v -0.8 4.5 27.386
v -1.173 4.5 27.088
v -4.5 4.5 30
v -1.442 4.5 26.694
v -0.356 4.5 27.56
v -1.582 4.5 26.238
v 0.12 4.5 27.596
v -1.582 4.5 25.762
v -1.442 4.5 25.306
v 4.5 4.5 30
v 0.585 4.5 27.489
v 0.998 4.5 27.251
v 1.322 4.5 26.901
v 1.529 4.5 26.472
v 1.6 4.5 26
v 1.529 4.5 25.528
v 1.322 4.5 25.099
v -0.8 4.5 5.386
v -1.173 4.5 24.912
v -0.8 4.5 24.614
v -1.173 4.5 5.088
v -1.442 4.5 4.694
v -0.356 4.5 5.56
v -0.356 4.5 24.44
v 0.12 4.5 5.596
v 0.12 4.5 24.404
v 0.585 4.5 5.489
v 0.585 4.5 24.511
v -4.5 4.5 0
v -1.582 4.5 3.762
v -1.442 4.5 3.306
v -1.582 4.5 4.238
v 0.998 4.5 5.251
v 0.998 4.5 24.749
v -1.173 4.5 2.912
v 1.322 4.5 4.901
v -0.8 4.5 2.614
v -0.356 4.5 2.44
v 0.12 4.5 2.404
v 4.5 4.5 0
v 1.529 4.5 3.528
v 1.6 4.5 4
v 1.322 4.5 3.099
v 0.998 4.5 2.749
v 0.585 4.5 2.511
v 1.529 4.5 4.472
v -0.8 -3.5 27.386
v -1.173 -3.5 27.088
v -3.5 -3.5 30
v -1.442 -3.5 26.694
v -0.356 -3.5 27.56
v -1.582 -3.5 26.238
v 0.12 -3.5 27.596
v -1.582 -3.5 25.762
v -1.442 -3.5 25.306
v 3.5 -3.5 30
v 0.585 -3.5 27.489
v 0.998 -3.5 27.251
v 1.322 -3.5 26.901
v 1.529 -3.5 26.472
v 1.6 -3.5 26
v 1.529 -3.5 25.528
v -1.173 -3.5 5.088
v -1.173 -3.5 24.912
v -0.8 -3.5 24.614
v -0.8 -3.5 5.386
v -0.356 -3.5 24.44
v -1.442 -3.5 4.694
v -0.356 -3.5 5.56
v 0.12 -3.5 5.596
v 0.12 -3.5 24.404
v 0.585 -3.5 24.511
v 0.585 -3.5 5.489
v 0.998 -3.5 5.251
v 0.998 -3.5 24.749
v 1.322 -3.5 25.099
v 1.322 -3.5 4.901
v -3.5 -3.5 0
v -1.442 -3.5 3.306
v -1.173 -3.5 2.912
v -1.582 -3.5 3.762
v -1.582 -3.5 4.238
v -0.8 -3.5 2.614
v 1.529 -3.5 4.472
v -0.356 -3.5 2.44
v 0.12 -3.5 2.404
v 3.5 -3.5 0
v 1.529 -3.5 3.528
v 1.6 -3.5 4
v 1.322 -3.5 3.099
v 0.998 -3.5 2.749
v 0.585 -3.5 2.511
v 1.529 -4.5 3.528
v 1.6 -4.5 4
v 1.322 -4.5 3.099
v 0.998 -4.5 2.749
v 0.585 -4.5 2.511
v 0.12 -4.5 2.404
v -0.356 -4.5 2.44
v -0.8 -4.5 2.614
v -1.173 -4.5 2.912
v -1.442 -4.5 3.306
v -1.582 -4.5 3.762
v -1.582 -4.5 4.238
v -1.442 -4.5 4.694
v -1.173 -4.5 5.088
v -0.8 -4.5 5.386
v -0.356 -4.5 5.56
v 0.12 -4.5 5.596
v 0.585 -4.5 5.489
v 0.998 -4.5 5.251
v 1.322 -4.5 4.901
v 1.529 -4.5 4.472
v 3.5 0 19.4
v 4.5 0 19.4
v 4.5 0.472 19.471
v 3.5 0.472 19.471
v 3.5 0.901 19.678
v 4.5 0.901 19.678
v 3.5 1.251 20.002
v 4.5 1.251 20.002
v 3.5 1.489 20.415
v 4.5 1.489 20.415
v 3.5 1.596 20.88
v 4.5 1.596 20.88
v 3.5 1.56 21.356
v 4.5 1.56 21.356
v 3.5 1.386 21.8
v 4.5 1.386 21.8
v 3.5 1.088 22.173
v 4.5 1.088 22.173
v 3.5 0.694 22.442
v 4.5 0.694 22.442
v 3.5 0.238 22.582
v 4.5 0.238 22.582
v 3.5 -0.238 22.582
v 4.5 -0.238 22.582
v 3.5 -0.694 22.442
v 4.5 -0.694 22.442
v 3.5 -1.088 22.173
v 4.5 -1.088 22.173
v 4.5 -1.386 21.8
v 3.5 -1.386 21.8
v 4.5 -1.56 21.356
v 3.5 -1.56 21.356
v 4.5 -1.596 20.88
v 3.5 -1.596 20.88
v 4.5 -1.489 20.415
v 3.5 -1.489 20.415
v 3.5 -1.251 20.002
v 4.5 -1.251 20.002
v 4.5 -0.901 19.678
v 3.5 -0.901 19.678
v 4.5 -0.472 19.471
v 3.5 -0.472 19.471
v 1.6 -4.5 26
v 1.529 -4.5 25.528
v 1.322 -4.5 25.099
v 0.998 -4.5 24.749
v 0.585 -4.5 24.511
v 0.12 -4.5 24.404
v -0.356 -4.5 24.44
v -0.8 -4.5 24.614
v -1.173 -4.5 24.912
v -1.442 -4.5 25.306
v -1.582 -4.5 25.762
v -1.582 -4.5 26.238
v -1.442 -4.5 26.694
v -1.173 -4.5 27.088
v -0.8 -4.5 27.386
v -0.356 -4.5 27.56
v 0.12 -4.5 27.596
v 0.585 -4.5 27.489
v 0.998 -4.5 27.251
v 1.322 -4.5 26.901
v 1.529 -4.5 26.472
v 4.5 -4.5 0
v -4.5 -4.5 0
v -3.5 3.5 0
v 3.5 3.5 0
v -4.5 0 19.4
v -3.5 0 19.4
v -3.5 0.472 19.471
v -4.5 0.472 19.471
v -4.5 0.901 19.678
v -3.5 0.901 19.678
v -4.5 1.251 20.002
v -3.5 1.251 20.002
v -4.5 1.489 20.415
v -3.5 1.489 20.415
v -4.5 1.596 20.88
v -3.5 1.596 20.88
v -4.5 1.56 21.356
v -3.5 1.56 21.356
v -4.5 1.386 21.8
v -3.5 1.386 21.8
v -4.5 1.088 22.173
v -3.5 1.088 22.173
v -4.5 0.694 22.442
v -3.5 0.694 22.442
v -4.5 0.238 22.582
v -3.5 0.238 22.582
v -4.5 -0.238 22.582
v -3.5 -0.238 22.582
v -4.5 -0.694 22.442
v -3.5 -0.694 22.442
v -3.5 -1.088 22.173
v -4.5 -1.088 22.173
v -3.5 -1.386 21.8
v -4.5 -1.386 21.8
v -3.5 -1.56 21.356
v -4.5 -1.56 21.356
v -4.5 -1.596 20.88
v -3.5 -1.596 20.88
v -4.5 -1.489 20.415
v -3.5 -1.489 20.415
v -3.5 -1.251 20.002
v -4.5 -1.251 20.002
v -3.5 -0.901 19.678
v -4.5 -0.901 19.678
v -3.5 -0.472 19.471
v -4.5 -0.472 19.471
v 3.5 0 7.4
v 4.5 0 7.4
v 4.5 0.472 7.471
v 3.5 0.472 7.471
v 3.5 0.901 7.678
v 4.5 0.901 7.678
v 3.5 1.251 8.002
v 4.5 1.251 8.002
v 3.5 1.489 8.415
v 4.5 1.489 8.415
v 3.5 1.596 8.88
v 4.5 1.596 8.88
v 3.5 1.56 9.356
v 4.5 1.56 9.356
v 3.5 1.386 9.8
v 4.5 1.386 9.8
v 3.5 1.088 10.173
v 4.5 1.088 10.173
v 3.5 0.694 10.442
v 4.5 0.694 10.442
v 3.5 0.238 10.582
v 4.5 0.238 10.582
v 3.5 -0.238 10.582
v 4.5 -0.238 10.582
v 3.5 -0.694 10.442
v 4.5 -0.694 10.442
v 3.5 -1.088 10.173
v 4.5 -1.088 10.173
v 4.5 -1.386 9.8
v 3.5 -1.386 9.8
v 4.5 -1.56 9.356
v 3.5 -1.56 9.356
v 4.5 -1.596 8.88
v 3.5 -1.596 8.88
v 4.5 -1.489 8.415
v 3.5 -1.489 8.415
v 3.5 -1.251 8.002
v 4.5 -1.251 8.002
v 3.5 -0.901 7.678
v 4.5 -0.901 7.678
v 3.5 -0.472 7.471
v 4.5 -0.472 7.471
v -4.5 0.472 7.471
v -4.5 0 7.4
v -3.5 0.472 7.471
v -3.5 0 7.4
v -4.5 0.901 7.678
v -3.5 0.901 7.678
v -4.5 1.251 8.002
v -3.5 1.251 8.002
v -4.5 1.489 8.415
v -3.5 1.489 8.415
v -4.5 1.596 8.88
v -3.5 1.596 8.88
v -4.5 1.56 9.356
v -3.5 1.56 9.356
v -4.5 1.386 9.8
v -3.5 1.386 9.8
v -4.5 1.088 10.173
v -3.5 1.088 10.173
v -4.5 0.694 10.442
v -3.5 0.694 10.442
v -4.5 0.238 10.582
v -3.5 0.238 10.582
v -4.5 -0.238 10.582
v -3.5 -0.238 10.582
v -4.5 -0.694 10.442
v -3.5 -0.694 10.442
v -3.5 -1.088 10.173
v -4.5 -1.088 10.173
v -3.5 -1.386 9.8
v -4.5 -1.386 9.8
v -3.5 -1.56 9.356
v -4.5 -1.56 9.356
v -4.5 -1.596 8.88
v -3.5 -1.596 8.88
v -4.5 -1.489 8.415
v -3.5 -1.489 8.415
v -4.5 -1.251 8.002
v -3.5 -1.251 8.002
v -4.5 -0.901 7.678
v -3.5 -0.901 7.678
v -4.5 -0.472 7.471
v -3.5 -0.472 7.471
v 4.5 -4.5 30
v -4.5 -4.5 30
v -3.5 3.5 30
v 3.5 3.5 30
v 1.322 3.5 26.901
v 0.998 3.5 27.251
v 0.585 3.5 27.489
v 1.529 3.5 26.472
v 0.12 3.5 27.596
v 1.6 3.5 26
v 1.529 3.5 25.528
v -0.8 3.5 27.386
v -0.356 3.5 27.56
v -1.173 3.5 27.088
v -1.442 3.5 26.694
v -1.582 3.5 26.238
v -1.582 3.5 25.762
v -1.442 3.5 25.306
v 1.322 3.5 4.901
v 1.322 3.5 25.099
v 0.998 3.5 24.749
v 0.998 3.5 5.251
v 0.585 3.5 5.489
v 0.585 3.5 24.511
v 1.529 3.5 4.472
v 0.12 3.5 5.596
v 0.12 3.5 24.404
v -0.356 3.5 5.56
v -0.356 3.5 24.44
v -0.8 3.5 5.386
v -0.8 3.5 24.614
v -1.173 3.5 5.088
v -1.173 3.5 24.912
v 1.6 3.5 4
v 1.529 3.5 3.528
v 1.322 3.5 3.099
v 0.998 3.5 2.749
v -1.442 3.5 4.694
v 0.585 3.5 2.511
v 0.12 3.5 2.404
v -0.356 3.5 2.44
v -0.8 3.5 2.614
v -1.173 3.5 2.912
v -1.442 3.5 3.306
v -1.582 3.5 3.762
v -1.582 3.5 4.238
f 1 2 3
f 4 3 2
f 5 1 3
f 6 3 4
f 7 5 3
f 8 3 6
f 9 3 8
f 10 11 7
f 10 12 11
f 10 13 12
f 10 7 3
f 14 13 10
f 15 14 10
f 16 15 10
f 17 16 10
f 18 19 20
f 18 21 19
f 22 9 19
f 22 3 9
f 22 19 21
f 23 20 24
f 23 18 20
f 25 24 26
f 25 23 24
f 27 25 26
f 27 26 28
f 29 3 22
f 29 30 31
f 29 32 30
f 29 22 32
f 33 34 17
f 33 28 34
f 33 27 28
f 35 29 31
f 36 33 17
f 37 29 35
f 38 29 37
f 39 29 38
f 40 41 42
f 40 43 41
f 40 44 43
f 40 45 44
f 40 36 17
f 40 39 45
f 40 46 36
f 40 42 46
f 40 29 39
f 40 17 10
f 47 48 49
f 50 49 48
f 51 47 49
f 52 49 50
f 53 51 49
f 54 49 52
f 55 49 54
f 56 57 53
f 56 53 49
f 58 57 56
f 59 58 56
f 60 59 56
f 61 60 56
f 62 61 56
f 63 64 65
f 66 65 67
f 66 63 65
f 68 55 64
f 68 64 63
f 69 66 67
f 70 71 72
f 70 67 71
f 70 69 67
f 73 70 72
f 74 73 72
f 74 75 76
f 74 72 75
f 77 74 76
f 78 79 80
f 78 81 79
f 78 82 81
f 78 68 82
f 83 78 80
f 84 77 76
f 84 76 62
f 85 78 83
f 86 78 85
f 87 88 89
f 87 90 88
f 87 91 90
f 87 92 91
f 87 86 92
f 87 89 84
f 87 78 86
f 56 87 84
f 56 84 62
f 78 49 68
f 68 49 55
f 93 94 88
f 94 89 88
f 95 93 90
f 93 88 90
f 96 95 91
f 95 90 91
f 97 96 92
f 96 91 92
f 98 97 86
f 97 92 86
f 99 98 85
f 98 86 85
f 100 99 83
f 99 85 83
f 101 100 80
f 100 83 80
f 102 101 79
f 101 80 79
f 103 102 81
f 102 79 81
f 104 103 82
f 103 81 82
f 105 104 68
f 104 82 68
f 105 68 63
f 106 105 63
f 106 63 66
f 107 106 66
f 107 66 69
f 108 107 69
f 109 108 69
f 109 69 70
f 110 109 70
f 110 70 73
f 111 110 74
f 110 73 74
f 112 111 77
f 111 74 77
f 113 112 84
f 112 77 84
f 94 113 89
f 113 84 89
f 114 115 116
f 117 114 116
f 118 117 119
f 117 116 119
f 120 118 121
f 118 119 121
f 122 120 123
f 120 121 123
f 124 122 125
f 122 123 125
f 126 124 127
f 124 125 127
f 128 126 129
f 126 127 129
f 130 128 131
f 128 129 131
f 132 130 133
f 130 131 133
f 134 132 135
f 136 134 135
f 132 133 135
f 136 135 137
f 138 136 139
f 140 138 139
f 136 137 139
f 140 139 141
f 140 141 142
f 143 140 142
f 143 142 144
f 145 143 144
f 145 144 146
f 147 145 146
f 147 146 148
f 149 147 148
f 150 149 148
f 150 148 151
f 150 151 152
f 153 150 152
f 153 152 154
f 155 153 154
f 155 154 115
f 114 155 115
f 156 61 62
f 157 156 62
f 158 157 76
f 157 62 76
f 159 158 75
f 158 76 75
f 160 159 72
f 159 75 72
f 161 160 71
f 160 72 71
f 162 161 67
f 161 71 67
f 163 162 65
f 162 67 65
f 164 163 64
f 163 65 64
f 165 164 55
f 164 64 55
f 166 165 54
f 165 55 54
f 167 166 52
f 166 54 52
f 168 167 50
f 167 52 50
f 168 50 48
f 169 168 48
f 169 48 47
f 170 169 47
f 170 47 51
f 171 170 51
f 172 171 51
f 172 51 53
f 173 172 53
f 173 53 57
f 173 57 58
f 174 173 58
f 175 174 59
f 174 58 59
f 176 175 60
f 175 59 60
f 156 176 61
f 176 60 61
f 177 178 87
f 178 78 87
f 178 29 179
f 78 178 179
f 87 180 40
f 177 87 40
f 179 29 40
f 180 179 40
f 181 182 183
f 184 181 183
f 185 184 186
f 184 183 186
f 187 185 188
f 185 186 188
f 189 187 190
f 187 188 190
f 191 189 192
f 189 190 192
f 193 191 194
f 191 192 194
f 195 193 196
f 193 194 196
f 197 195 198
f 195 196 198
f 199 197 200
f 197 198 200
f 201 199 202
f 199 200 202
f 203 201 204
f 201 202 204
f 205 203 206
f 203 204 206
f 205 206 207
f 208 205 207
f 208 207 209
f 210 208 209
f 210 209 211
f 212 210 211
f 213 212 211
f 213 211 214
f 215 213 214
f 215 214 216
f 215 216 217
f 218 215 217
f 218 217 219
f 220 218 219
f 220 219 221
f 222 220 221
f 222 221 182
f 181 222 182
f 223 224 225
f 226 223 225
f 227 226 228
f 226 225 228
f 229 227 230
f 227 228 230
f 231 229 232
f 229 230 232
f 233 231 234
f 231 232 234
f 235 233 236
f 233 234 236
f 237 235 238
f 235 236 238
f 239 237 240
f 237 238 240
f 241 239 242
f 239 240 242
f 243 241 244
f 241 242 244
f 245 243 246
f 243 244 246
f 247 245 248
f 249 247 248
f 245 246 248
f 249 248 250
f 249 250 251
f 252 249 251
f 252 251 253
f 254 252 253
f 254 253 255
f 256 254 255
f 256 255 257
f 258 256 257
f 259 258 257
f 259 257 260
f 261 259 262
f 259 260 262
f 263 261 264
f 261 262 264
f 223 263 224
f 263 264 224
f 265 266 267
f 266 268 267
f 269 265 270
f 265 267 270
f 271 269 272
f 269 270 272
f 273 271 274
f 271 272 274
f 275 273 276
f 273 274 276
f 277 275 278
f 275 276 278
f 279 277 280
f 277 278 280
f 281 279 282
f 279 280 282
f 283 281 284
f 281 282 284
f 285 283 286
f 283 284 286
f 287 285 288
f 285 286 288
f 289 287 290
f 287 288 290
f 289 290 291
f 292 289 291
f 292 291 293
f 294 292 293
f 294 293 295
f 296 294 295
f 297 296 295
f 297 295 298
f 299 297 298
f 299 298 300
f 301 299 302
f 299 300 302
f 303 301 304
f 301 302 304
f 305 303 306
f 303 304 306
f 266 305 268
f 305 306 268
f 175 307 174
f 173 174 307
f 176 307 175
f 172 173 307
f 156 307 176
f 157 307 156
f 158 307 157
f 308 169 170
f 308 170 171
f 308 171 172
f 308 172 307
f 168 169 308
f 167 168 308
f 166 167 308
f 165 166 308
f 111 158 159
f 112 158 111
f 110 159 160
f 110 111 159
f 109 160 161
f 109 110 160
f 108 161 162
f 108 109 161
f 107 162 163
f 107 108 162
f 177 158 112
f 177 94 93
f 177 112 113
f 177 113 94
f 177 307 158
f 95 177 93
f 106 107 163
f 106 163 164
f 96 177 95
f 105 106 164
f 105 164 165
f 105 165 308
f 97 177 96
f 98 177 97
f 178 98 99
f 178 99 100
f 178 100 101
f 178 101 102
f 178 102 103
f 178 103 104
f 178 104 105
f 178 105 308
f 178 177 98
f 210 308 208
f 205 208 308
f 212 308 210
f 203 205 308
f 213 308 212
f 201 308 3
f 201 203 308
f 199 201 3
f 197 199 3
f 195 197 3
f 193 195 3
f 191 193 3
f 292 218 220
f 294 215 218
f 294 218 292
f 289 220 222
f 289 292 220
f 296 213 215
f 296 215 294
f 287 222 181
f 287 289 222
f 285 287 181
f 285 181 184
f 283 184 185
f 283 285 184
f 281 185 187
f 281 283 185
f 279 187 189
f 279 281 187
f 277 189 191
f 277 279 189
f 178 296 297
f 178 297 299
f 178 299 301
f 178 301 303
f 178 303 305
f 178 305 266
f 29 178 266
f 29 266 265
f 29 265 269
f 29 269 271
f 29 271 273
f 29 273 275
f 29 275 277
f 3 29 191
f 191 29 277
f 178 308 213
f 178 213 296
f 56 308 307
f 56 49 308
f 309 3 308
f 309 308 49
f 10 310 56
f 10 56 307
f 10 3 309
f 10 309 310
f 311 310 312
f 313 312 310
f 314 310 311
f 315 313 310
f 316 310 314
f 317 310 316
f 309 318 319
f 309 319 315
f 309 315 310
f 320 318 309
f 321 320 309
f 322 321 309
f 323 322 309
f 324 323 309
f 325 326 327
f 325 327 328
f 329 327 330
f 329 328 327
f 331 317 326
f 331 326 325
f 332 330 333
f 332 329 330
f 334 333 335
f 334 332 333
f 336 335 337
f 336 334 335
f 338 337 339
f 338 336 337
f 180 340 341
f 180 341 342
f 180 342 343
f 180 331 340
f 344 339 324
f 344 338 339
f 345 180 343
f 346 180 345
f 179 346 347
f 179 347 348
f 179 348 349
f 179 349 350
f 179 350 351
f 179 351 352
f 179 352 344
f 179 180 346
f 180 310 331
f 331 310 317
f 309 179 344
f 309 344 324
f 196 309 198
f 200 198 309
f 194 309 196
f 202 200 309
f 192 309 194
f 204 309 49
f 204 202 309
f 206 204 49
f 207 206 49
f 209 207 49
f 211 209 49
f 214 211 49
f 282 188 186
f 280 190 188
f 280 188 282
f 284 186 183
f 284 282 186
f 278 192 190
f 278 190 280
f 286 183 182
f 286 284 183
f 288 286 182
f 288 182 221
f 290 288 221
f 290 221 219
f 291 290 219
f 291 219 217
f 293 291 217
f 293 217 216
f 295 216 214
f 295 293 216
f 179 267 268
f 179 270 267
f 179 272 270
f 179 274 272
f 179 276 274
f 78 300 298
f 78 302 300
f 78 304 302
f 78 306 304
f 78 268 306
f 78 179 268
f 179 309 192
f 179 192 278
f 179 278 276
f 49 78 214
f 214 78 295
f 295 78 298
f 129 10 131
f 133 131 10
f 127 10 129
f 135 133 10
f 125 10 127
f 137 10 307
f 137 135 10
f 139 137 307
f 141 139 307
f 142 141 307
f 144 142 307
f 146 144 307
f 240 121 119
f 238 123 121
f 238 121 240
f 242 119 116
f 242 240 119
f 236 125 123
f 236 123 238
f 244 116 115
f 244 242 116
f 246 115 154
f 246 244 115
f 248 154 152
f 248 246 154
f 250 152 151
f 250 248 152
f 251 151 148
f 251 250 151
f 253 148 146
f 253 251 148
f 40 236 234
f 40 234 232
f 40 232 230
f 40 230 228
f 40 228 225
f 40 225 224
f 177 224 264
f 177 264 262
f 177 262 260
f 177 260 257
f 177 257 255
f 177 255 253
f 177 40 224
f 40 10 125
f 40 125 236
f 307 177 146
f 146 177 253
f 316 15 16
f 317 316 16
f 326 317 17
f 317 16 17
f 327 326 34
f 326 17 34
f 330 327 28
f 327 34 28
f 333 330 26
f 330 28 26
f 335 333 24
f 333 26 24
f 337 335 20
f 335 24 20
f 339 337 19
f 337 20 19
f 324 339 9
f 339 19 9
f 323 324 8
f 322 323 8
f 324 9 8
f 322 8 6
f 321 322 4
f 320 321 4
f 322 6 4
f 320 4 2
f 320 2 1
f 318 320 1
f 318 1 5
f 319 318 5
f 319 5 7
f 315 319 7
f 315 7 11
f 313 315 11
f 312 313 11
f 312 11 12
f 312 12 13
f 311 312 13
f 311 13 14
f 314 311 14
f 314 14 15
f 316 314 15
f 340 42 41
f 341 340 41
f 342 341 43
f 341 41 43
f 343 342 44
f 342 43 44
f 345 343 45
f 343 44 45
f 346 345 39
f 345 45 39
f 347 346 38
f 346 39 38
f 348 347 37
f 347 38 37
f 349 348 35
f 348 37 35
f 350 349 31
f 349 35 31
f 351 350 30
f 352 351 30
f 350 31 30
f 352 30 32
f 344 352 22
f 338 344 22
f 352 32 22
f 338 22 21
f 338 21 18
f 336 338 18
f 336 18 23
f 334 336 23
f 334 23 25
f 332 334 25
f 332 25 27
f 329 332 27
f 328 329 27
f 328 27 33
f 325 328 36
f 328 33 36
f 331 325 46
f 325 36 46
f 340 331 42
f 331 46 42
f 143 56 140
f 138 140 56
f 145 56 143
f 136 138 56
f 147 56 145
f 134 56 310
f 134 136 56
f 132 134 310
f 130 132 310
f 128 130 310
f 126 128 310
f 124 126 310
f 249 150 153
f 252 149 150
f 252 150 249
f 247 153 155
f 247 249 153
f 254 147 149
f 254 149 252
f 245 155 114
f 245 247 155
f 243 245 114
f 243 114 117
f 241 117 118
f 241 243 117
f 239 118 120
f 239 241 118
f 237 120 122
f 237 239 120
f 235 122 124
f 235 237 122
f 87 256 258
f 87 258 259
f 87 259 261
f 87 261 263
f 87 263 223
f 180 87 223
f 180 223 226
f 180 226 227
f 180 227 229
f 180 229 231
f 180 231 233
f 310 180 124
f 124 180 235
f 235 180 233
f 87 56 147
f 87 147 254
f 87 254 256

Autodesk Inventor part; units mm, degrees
ref_plane "YZ Plane" through (0, 0, 0) normal (1, 0, 0) x (0, 1, 0)
ref_plane "XZ Plane" through (0, 0, 0) normal (0, 1, 0) x (-1, 0, 0)
ref_plane "XY Plane" through (0, 0, 0) normal (0, 0, 1) x (1, 0, 0)
sketch "スケッチ1" plane through (0, 0, 0) normal (0, 0, 1) x (1, 0, 0)
  line L0 (4.5, -4.5) -> (-4.5, -4.5)
  line L1 (-4.5, -4.5) -> (-4.5, 4.5)
  line L2 (-4.5, 4.5) -> (4.5, 4.5)
  line L3 (4.5, 4.5) -> (4.5, -4.5)
  line L4 (4.5, -4.5) -> (-4.5, 4.5) construction
  line L5 (-4.5, -4.5) -> (4.5, 4.5) construction
  line L6 (3.5, 3.5) -> (-3.5, 3.5)
  line L7 (-3.5, 3.5) -> (-3.5, -3.5)
  line L8 (-3.5, -3.5) -> (3.5, -3.5)
  line L9 (3.5, -3.5) -> (3.5, 3.5)
  point P0 (0, 0)
  dimension "d0" = 9
  dimension "d1" = 9
  dimension "d2" = 1
extrude "押し出し1" add sketch "スケッチ1" along normal blind 30
sketch "スケッチ2" plane through (-4.5, 4.5, 0) normal (0, 1, 0) x (1, 0, 0)
  line L0 (0, 0) -> (9, 0) projected
  line L1 (0, 0) -> (0, -30) projected
  line L2 (9, -30) -> (0, -30) projected
  line L3 (9, 0) -> (9, -30) projected
  line L4 (4.5, -30) -> (4.5, 0) construction
  line L5 (4.5, -15) -> (0, -15) construction
  circle A0 centre (4.5, -26) radius 1.6
  circle A1 centre (4.5, -4) radius 1.6
  dimension "d5" = 3.2
  dimension "d6" = 4
extrude "押し出し2" cut sketch "スケッチ2" against normal through all contours A0 | A1
sketch "スケッチ3" plane through (4.5, -4.5, 0) normal (1, 0, 0) x (0, 0, -1)
  line L0 (0, 9) -> (0, 0) projected
  line L1 (0, 9) -> (-30, 9) projected
  line L2 (-30, 0) -> (-30, 9) projected
  line L3 (0, 0) -> (-30, 0) projected
  line L4 (-30, 4.5) -> (0, 4.5) construction
  line L5 (-15, 4.5) -> (-15, 9) construction
  circle A0 centre (-21, 4.5) radius 1.6
  circle A1 centre (-9, 4.5) radius 1.6
  line L6 (-9, 4.5) -> (-21, 4.5)
  line L7 (0, 9) -> (-30, 9) projected
  dimension "d9" = 3.2
  dimension "d13" = 12
extrude "押し出し3" cut sketch "スケッチ3" against normal through all contours A0 | A1
properties part number "肩ピッチ固定角柱B_9×9" material "アルミニウム 2014-T6"
